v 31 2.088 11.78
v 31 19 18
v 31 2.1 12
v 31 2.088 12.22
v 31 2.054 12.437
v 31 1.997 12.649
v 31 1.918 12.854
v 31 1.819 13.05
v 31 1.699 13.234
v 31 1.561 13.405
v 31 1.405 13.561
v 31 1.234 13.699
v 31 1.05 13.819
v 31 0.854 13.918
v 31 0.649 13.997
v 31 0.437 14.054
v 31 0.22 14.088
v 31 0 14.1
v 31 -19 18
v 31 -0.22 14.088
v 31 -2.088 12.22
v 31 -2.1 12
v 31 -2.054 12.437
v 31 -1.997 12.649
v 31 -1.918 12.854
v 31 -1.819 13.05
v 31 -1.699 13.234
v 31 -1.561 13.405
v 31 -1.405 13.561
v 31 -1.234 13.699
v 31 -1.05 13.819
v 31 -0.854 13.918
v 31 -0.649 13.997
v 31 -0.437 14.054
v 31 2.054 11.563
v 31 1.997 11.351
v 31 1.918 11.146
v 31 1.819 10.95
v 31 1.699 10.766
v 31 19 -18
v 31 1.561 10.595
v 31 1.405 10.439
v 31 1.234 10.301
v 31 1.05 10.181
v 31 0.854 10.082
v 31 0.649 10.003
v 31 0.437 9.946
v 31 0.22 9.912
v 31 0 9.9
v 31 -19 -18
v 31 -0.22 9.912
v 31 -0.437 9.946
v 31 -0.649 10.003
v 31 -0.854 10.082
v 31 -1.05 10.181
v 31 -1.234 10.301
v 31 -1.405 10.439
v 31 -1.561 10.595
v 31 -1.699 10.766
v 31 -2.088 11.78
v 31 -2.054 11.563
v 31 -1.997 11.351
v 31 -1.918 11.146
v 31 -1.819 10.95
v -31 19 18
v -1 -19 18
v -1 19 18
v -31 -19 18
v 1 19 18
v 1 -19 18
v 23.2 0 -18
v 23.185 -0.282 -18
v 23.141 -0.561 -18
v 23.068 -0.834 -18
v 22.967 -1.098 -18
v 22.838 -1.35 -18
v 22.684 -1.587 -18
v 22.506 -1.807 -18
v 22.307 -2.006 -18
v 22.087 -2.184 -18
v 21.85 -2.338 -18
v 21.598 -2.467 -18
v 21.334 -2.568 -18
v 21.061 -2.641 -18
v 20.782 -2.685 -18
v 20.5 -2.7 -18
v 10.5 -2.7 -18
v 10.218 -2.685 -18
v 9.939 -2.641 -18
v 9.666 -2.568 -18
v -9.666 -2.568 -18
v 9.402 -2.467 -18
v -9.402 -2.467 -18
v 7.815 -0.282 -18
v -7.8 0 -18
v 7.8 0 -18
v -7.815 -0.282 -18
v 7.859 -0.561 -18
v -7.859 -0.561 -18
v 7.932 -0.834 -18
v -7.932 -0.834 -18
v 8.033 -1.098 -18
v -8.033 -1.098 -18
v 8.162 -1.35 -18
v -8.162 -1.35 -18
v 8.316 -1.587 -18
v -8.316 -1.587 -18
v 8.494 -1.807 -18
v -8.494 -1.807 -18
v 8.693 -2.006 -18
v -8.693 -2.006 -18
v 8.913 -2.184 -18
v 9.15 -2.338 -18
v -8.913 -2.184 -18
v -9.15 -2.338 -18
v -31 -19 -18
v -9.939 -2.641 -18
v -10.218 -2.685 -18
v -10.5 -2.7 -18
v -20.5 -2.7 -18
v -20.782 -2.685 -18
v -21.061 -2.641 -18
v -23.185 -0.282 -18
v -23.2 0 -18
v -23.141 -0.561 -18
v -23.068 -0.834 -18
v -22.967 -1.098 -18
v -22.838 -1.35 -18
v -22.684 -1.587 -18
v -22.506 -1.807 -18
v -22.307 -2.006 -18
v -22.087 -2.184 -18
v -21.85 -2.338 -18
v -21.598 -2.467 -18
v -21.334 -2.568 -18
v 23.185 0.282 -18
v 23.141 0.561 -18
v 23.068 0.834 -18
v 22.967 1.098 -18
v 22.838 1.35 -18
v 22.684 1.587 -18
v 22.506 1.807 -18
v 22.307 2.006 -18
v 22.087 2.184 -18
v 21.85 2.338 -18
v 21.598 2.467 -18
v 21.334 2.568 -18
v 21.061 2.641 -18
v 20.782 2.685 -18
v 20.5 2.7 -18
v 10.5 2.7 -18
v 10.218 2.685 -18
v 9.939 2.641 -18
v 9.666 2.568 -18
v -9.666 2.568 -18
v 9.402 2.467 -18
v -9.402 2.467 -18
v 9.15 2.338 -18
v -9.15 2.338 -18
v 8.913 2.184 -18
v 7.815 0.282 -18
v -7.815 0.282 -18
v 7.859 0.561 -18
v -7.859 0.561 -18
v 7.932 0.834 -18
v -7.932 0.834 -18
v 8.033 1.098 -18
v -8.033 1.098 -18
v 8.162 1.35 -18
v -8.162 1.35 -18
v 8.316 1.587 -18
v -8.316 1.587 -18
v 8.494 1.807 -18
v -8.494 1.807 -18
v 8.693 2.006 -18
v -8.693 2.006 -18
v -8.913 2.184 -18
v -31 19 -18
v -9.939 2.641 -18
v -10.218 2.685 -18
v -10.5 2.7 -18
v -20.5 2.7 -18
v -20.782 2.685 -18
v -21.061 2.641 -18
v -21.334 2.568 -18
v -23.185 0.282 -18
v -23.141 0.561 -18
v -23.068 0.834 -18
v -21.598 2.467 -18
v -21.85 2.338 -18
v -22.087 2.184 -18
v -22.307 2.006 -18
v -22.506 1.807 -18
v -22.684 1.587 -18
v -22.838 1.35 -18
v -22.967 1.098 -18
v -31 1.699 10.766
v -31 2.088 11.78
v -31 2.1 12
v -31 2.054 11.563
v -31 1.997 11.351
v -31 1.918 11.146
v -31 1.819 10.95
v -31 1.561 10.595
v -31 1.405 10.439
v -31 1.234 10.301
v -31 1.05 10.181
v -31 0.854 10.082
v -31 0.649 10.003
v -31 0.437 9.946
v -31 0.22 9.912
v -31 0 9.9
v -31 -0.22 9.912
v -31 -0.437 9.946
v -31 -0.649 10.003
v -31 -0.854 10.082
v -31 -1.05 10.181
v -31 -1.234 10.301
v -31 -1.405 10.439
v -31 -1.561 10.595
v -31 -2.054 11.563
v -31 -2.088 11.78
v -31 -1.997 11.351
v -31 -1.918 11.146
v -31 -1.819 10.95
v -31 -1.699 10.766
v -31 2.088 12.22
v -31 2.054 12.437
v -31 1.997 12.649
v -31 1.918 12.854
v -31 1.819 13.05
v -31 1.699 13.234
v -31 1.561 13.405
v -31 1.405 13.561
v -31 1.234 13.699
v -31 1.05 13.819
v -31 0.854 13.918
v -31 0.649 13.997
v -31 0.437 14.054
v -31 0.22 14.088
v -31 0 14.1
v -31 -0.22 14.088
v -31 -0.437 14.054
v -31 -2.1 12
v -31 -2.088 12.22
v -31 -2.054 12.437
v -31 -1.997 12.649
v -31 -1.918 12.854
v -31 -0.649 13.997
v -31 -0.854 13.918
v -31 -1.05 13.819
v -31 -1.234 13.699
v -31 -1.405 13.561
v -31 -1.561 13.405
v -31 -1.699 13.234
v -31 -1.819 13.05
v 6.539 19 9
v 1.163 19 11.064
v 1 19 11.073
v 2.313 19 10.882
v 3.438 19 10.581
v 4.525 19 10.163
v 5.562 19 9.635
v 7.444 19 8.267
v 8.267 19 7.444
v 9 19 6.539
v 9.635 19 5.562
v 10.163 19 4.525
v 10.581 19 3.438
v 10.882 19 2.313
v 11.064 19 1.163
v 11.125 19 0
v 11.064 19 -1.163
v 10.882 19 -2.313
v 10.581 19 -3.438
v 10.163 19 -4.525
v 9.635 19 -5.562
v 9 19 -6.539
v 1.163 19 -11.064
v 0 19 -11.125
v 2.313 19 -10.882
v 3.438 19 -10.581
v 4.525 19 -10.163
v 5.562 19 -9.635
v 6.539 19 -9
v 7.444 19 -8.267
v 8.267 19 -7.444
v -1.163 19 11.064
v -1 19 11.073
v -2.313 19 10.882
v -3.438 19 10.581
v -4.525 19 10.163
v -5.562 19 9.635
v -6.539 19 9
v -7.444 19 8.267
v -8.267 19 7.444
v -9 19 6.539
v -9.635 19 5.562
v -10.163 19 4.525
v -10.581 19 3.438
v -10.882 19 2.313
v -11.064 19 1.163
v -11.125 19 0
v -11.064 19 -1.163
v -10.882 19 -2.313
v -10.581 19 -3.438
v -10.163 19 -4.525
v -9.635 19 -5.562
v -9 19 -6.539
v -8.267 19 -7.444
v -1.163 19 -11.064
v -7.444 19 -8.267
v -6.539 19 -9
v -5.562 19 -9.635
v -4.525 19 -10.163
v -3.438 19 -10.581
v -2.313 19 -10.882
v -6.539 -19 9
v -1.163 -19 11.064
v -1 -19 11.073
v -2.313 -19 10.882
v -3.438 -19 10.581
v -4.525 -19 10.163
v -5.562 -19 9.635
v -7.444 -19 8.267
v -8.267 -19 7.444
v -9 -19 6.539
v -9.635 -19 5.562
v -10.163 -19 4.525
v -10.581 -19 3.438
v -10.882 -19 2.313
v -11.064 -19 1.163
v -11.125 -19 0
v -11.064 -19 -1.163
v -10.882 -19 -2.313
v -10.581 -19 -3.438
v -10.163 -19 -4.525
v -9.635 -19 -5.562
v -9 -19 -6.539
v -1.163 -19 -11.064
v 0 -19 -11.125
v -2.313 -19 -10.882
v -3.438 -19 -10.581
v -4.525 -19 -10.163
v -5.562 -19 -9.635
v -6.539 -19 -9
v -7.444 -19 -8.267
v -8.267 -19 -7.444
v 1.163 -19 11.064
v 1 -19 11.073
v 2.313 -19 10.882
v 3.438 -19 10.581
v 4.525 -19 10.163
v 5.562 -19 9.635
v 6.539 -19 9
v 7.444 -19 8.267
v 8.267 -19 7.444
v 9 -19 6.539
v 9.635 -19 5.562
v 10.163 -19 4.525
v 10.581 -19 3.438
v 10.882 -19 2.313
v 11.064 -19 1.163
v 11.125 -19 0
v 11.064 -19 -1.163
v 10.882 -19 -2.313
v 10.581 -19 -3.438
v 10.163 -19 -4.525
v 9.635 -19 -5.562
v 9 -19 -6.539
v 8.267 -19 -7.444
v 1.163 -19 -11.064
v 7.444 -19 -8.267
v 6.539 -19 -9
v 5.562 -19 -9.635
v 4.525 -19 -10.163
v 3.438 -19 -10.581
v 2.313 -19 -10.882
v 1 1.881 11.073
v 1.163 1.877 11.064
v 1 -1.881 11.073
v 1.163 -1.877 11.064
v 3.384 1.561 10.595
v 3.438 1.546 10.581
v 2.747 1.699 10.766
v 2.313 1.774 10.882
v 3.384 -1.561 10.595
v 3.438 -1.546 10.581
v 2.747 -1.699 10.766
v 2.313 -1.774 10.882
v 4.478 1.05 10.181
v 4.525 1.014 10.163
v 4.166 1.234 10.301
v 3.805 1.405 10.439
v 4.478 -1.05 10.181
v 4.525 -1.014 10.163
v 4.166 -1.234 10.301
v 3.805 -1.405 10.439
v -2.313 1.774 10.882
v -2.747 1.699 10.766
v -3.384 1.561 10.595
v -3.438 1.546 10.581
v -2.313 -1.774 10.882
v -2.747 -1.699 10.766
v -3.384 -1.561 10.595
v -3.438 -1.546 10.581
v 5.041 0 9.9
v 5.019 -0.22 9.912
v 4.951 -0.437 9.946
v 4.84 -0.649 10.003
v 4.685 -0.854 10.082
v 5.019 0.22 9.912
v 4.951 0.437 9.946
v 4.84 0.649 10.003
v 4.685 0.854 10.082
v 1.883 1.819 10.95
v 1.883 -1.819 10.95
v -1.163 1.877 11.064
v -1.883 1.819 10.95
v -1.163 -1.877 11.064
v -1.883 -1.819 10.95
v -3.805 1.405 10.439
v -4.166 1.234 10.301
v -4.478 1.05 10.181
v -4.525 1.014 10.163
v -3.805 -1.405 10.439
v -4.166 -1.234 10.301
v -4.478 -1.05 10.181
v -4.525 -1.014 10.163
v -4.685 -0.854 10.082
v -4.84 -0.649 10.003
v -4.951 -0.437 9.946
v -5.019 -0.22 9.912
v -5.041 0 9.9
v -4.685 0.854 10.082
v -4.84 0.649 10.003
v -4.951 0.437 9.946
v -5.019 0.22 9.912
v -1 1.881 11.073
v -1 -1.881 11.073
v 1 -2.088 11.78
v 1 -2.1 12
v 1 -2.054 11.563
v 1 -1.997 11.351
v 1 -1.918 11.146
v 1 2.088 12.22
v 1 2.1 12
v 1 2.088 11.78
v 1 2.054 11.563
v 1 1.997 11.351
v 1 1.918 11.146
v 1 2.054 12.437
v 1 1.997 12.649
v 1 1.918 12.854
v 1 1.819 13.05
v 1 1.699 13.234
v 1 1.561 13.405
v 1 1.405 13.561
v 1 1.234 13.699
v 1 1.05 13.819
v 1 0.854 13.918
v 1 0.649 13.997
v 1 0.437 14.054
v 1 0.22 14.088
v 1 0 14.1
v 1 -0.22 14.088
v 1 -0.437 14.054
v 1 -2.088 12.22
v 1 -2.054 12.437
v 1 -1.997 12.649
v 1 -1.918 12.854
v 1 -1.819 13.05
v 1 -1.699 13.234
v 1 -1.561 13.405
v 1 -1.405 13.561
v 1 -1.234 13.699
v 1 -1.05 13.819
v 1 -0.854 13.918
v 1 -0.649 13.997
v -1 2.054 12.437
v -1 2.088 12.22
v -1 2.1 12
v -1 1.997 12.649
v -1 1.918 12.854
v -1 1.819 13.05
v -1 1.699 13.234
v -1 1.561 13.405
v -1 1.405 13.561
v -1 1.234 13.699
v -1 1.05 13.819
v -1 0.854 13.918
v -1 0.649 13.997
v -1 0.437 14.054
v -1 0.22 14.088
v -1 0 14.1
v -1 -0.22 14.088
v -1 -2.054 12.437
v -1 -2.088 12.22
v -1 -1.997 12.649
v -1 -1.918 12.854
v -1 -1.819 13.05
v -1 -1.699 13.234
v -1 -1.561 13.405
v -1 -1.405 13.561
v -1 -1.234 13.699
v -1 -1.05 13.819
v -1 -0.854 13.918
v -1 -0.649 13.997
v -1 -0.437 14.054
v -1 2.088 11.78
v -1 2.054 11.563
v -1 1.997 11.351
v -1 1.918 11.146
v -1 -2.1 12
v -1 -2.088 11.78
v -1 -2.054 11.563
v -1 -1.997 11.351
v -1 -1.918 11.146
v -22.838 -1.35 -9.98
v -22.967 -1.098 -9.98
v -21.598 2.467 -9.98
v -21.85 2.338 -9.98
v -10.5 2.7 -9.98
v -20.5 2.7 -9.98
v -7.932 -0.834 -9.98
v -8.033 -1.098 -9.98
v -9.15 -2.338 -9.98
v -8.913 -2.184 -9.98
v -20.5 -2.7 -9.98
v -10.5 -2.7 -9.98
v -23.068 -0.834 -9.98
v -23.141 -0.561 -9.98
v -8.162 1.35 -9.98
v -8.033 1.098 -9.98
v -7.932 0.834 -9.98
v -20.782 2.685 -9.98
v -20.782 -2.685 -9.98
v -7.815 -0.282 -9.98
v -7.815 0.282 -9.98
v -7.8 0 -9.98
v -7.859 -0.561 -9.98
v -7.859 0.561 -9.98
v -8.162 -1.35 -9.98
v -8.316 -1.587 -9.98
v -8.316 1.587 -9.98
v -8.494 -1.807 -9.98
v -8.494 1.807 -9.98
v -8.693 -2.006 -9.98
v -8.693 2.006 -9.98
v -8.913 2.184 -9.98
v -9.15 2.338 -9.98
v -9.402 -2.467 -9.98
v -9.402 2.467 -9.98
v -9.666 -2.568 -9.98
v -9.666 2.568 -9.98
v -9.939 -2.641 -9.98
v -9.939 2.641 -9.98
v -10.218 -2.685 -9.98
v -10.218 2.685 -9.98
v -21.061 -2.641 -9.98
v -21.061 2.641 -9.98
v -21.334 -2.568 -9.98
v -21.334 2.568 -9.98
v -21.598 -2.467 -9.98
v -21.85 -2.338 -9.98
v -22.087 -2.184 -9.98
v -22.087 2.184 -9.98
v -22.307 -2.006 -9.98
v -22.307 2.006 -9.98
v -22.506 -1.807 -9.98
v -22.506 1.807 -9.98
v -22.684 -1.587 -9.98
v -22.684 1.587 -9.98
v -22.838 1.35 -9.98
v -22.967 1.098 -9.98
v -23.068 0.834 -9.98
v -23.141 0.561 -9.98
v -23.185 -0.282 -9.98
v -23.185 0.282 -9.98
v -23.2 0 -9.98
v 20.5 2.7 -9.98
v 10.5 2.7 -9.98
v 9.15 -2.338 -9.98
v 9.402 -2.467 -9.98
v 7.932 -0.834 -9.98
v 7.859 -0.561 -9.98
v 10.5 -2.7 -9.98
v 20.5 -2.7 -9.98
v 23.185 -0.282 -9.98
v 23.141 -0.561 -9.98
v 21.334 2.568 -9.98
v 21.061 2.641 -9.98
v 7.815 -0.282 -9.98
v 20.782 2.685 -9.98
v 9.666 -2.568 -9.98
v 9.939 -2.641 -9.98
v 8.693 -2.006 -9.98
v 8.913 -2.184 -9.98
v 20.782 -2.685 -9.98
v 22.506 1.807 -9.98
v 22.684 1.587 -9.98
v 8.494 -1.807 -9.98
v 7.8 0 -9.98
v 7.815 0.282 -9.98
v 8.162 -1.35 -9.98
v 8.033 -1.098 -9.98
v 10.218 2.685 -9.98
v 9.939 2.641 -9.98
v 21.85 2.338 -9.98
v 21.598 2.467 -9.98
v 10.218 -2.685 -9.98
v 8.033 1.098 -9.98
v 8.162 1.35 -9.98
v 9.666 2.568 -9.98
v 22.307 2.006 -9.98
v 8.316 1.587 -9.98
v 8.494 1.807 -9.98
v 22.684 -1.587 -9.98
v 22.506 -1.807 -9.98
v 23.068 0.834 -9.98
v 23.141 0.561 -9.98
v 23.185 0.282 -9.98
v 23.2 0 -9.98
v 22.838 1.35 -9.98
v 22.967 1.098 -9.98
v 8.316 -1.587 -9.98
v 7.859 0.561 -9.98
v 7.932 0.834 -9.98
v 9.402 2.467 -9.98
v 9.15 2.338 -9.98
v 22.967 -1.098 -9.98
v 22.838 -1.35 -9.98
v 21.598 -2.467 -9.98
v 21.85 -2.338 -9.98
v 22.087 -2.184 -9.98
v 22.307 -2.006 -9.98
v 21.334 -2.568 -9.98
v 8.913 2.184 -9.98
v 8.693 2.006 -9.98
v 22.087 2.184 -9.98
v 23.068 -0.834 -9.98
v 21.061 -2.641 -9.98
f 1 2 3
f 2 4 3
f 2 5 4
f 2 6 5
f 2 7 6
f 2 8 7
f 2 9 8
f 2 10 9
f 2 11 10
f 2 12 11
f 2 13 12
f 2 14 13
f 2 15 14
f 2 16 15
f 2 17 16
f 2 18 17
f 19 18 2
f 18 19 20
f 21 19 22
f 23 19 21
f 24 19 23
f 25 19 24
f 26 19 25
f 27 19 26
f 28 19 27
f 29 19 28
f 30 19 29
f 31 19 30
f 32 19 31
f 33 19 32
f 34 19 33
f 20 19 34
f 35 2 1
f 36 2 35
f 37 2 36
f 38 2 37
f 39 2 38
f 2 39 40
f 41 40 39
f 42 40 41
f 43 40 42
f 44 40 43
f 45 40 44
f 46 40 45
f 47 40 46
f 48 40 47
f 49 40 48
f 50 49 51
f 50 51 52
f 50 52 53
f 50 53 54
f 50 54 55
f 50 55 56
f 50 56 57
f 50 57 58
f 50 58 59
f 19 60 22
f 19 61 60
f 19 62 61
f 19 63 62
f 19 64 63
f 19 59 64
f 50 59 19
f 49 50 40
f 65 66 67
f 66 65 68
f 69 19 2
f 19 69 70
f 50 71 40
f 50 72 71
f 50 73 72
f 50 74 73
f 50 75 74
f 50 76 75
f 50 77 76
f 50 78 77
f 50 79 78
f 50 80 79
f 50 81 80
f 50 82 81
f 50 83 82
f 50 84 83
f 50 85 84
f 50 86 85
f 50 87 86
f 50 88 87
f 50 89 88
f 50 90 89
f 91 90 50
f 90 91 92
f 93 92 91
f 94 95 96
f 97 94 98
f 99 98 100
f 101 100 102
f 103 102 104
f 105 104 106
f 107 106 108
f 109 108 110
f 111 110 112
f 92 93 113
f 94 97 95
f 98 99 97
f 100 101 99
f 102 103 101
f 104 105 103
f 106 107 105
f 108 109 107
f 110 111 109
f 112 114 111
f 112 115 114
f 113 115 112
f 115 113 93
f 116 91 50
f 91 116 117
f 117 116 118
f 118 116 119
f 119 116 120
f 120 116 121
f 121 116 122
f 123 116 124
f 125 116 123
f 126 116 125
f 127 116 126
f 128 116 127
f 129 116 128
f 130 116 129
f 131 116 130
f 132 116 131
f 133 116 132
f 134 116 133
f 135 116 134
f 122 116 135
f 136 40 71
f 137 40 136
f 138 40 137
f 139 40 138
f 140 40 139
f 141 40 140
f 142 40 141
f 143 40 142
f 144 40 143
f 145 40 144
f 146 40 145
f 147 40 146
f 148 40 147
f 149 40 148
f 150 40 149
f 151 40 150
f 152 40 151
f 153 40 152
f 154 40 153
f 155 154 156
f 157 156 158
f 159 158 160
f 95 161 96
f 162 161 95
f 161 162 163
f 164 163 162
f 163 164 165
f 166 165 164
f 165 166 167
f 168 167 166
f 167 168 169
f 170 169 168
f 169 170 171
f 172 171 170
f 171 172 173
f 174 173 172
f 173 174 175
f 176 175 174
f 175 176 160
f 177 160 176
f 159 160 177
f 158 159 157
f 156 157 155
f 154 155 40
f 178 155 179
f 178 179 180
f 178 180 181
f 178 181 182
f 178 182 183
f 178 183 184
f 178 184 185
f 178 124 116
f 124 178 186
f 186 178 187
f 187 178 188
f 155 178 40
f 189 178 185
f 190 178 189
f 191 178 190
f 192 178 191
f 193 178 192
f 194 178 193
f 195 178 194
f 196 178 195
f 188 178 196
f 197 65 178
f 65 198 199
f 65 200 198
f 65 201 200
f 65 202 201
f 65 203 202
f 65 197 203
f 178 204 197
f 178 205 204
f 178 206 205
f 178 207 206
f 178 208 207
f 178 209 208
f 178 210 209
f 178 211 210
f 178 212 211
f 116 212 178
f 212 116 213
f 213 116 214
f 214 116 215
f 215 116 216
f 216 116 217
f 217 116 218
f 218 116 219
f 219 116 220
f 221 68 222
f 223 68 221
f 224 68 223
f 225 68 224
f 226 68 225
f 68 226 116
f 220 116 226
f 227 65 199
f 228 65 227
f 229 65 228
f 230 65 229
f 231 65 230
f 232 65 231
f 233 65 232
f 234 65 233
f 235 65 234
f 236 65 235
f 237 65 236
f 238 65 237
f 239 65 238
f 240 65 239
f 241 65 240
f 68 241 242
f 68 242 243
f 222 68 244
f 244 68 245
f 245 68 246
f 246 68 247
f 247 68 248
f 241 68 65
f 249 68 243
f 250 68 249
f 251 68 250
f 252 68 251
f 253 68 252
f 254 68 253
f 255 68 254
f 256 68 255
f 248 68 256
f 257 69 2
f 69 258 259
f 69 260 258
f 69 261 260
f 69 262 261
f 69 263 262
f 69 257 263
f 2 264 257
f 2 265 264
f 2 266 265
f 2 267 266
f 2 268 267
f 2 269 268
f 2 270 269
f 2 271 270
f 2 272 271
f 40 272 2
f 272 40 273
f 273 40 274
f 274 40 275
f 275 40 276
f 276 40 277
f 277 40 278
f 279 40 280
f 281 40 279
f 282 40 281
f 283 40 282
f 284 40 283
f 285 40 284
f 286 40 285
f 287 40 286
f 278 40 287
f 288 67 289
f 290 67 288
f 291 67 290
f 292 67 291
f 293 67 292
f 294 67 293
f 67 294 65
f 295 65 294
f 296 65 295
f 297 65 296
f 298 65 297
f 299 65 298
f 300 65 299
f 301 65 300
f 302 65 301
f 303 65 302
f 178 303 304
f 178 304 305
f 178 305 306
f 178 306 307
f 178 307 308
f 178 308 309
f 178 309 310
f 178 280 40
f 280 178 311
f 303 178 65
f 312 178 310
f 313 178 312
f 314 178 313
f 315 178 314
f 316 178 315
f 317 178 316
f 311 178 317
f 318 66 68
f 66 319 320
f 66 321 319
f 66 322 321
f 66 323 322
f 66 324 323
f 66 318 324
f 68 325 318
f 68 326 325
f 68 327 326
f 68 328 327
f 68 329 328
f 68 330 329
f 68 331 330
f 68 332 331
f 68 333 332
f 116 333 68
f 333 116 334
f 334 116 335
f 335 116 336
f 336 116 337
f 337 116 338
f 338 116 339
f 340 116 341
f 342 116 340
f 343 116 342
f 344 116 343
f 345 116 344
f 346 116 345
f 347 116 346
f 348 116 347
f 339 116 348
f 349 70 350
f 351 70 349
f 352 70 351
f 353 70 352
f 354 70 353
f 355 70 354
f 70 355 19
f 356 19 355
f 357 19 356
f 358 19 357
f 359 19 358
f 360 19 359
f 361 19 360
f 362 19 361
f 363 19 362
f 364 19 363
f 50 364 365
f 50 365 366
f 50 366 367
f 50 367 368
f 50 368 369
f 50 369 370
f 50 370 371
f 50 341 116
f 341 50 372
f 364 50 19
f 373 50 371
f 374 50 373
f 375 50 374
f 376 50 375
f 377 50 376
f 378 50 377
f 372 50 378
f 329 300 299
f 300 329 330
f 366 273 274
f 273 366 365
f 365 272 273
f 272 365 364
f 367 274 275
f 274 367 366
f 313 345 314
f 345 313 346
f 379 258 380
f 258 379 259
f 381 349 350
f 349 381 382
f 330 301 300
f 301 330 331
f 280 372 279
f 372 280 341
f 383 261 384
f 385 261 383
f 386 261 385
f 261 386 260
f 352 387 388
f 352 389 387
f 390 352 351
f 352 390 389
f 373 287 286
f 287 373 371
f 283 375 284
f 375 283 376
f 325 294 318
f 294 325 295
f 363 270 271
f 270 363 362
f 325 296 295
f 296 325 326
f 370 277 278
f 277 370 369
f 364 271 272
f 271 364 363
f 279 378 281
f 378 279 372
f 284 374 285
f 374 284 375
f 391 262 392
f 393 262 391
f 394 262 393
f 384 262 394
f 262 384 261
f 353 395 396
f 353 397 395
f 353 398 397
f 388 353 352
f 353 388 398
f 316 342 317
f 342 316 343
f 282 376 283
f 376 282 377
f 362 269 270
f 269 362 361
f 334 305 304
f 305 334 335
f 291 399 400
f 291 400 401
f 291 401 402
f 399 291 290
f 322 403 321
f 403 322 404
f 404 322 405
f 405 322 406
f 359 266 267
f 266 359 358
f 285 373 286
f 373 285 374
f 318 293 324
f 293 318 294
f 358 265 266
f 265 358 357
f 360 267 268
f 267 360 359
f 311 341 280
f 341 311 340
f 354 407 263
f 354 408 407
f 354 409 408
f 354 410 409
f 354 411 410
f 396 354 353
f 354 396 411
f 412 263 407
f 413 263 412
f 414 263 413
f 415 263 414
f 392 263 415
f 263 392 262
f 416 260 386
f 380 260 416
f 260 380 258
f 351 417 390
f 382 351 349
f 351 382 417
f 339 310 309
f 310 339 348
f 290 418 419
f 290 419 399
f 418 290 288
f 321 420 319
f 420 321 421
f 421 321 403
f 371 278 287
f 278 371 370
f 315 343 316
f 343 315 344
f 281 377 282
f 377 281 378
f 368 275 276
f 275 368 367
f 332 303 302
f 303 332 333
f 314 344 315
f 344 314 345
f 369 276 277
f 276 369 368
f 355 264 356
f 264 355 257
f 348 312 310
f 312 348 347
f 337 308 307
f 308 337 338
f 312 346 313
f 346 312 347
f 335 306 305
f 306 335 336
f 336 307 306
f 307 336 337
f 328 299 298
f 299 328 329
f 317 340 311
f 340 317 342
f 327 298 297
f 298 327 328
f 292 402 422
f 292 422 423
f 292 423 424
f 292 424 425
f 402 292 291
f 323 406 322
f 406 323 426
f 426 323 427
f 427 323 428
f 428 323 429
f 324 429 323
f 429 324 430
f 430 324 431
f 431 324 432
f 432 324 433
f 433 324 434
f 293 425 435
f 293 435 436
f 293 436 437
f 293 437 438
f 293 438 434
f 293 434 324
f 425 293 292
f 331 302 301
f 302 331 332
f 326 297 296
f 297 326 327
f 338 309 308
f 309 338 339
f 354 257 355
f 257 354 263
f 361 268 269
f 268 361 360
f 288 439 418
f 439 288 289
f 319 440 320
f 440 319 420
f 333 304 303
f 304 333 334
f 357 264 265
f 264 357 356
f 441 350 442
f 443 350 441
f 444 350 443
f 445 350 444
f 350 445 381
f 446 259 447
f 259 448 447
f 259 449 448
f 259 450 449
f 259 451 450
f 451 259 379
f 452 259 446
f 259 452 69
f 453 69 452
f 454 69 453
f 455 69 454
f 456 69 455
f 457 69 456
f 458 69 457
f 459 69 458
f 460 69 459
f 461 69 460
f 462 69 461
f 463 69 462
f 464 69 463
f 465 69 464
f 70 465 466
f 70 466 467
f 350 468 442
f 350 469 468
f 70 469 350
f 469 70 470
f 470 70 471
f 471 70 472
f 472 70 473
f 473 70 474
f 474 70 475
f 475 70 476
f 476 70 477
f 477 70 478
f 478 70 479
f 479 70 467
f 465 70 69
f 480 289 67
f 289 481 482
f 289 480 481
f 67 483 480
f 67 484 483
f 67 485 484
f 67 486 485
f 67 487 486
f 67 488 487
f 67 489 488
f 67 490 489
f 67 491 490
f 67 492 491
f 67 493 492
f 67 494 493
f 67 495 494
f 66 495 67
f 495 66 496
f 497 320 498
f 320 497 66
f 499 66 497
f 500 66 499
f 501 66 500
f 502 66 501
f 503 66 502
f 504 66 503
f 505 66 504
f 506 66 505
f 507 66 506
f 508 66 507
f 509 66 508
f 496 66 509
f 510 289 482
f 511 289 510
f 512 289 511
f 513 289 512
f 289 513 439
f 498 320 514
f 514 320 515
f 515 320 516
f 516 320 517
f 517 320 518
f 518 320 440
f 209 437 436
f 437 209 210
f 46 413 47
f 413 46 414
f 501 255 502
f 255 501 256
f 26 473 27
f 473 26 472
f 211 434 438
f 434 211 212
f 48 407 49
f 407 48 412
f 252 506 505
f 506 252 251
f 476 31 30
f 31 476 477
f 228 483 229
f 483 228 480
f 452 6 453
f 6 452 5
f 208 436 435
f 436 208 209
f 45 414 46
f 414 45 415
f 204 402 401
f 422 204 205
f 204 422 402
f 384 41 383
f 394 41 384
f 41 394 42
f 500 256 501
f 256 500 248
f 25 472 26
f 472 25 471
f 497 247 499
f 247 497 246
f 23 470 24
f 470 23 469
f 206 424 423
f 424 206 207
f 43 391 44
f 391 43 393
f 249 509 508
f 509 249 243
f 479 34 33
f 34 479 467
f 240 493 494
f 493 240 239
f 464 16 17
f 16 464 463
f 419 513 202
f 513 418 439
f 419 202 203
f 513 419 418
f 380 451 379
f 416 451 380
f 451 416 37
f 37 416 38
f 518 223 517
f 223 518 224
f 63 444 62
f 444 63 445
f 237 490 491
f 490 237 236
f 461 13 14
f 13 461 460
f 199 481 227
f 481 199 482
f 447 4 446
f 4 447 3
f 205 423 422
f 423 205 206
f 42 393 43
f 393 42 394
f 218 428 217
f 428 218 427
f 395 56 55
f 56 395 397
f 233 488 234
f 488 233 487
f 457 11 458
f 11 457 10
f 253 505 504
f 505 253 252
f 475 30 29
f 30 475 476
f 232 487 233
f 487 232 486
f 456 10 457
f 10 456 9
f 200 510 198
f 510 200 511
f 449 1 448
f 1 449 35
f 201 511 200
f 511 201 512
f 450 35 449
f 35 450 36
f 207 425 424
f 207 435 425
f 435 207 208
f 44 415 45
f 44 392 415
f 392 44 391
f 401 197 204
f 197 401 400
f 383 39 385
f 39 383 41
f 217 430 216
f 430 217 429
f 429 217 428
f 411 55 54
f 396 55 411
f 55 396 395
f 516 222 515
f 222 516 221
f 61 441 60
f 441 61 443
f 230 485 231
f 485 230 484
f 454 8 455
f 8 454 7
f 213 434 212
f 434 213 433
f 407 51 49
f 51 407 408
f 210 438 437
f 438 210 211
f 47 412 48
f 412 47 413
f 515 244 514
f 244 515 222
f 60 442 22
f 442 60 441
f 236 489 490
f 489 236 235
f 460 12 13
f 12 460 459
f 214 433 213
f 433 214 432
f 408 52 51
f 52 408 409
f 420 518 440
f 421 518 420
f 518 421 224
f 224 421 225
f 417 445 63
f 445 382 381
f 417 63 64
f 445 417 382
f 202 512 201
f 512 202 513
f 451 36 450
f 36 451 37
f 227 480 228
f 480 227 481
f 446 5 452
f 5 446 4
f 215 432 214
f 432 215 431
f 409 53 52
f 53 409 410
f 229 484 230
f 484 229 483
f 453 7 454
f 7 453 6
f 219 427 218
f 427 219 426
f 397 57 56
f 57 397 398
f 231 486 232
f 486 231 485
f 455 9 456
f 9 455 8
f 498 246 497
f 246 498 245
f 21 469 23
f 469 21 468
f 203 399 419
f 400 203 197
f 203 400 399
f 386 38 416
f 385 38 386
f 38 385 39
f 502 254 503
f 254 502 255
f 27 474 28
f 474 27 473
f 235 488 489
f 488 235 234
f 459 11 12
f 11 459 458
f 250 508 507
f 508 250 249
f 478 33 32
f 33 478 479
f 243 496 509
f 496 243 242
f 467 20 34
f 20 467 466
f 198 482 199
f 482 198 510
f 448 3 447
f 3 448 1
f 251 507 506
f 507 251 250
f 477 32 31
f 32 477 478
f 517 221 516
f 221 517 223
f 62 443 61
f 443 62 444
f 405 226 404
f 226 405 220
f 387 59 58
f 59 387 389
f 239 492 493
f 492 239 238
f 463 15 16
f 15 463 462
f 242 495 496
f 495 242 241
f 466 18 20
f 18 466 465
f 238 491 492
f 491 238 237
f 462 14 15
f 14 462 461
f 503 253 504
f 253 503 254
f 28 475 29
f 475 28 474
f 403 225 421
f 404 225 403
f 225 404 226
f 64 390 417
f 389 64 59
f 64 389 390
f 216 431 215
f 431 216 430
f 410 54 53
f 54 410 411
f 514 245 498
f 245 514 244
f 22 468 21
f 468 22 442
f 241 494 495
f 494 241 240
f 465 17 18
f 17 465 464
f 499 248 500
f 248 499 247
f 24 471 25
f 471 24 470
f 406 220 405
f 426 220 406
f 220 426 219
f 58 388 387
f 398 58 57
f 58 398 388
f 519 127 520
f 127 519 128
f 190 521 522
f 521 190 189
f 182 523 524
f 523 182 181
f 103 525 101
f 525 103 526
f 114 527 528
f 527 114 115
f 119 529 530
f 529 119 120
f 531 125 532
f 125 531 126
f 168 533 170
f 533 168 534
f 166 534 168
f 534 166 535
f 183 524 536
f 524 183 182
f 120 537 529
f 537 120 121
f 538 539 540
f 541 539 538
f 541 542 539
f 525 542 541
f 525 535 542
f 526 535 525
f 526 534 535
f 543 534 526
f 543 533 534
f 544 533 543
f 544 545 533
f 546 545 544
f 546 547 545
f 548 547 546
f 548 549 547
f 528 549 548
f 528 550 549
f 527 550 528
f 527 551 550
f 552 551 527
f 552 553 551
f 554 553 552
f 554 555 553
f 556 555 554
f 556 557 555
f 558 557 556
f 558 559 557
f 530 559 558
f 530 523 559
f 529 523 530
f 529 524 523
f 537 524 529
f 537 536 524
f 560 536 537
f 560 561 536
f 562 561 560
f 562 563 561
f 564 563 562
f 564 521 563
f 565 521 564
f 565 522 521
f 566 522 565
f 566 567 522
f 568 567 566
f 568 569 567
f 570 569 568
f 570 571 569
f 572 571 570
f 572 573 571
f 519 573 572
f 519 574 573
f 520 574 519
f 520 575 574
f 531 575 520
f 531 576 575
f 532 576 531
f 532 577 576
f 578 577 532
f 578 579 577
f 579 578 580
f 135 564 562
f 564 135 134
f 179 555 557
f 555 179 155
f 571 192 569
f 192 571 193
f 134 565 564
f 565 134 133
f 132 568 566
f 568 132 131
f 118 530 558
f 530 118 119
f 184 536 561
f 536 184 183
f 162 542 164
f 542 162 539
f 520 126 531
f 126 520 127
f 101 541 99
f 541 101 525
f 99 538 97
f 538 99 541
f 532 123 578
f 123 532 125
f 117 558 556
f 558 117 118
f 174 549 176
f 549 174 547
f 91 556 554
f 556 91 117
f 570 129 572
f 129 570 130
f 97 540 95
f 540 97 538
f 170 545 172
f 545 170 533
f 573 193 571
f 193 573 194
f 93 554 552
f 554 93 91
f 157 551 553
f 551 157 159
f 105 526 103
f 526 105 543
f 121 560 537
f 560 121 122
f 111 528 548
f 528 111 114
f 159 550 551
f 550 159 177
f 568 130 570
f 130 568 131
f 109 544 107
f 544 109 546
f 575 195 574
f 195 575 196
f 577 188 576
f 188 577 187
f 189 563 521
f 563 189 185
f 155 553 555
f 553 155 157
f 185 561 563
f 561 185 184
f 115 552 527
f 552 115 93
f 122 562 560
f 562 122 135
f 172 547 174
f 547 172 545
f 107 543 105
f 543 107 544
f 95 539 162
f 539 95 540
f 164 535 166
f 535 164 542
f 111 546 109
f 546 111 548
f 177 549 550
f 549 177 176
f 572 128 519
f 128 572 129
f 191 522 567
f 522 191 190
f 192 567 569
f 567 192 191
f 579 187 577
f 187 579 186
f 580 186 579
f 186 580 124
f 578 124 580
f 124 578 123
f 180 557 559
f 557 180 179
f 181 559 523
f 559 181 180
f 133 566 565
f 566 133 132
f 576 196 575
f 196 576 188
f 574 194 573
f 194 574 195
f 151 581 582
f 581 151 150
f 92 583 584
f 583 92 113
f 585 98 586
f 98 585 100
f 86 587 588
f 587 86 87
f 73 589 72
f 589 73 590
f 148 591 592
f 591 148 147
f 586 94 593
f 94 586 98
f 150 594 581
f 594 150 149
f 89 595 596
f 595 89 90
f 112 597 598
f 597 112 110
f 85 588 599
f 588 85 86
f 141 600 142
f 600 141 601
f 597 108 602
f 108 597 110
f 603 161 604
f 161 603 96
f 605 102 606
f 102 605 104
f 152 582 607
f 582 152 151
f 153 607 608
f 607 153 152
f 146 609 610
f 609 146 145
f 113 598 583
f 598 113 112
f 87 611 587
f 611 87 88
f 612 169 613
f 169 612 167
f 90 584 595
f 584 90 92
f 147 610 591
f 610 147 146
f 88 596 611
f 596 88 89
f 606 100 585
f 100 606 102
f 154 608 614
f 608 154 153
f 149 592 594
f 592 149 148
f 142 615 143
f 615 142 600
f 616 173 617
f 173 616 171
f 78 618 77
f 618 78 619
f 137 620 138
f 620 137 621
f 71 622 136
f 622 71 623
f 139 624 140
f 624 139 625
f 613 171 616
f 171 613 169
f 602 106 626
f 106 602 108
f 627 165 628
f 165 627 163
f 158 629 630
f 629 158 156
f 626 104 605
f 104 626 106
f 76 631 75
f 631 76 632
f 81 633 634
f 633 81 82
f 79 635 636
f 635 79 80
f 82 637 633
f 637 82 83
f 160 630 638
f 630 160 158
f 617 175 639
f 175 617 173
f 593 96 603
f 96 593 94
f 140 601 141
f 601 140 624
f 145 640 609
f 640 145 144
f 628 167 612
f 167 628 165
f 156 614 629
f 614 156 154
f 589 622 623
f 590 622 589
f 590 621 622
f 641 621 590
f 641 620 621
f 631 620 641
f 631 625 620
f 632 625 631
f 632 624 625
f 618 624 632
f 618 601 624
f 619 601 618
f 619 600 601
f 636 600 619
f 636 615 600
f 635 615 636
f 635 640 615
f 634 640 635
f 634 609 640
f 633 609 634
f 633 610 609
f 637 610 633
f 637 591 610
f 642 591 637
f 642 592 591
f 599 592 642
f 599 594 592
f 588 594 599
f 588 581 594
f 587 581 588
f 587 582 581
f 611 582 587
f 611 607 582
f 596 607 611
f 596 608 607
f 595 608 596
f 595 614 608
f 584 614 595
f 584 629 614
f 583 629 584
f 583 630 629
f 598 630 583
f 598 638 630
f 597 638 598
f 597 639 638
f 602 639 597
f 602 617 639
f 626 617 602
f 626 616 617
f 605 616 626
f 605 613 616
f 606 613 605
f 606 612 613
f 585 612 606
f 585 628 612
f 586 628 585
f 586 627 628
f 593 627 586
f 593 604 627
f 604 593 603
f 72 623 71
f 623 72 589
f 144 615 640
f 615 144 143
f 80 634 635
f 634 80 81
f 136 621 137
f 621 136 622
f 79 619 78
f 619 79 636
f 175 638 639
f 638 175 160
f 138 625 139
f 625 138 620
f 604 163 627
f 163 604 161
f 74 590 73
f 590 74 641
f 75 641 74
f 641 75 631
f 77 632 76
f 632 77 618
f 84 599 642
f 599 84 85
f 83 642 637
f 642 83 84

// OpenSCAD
// Split housing for 22 mm OD linear bearing.
$fn = 60;
eps = 0.02;
bearing_d = 22;
body_l = 62;
body_d = 38;
body_h = 36;
slot_w = 2;
module mount_slot(x) {
    hull() {
        translate([x - 5, 0, -body_h / 2 - eps]) cylinder(d = 5.4, h = 8 + 2 * eps);
        translate([x + 5, 0, -body_h / 2 - eps]) cylinder(d = 5.4, h = 8 + 2 * eps);
    }
}
difference() {
    cube([body_l, body_d, body_h], center = true);
    translate([0, -body_d / 2 - eps, 0]) rotate([-90, 0, 0]) cylinder(d = bearing_d + 0.25, h = body_d + 2 * eps);
    translate([-slot_w / 2, -body_d / 2 - eps, 0]) cube([slot_w, body_d + 2 * eps, body_h / 2 + eps]);
    translate([-body_l / 2 - eps, 0, body_h / 2 - 6]) rotate([0, 90, 0]) cylinder(d = 4.2, h = body_l + 2 * eps);
    mount_slot(-body_l / 4);
    mount_slot(body_l / 4);
}
